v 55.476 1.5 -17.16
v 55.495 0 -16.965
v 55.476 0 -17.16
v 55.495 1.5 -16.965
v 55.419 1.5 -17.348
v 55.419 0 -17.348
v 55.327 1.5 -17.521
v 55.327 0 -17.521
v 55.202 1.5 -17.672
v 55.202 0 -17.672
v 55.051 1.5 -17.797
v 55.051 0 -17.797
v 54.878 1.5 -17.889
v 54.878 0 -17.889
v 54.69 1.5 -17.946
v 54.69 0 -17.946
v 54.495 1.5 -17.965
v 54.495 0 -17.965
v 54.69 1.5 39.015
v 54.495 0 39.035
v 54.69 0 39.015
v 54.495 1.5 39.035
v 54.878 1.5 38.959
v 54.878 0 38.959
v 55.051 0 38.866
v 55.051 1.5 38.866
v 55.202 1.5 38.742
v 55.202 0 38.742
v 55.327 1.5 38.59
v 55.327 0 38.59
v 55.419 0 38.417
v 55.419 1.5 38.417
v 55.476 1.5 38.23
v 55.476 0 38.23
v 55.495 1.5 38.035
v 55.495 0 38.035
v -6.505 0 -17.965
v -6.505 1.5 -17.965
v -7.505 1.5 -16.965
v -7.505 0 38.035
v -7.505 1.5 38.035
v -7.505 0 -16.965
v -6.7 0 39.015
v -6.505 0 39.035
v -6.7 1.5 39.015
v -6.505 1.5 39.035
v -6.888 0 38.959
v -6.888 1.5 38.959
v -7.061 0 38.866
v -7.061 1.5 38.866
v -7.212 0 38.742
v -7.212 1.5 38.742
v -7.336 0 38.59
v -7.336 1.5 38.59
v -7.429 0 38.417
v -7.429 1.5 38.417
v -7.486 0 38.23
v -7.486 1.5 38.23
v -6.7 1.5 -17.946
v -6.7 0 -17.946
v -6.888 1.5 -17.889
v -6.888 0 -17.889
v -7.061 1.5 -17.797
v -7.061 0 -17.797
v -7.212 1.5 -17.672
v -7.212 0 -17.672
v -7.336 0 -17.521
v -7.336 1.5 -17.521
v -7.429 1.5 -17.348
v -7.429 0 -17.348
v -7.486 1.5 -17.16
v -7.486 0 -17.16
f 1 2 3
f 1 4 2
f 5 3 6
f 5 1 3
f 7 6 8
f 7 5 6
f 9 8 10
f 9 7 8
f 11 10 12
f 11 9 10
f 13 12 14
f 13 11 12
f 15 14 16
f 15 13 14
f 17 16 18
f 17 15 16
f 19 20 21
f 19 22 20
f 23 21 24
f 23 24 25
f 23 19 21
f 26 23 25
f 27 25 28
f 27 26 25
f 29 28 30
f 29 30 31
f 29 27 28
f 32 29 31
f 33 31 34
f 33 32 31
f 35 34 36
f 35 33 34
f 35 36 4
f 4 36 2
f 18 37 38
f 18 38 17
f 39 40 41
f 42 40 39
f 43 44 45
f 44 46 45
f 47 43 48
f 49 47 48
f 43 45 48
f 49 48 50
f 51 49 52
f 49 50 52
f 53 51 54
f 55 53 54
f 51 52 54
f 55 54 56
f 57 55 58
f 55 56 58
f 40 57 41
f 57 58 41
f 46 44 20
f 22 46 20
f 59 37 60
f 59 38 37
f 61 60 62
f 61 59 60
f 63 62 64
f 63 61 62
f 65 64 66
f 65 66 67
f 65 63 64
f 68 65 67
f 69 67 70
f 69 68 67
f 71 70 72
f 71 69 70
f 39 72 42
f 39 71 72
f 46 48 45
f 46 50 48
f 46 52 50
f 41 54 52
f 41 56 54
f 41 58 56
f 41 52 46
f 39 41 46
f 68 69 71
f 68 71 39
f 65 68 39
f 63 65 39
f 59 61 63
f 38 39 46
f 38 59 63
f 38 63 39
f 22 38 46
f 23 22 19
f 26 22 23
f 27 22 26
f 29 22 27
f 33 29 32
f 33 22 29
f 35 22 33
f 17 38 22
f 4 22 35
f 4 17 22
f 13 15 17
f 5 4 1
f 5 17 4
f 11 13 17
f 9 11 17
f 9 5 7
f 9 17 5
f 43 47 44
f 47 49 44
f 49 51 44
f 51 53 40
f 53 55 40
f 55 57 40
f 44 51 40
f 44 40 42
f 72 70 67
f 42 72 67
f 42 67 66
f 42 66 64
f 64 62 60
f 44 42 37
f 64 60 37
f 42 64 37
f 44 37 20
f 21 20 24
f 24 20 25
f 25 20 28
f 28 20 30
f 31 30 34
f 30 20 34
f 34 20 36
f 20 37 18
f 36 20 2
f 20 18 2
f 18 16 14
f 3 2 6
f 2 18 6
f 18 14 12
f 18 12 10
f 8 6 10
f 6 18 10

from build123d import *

# Parameters (mm, degrees)
SKETCH1_W           = 63
SKETCH1_H           = 57
BOSS_EXTRUDE1_DEPTH = 1.5
FILLET1_R           = 1
FILLET2_R           = 1
FILLET3_R           = 1


with BuildPart() as part:
    # Sketch1 → Boss-Extrude1 (new body)
    with BuildSketch(Plane(origin=(0, 0, 0), x_dir=(1, 0, 0), z_dir=(0, 1, 0))):
        with Locations((23.995049505, -10.534653465)):
            Rectangle(SKETCH1_W, SKETCH1_H)
    extrude(amount=BOSS_EXTRUDE1_DEPTH)

    # Fillet1
    fillet1_edges = [part.edges().sort_by_distance(p)[0] for p in [
        (55.495049505, 0.75, 39.034653465),
    ]]
    fillet(fillet1_edges, radius=FILLET1_R)

    # Fillet2
    fillet2_edges = [part.edges().sort_by_distance(p)[0] for p in [
        (55.495049505, 0.75, -17.965346535),
    ]]
    fillet(fillet2_edges, radius=FILLET2_R)

    # Fillet3
    fillet3_edges = [part.edges().sort_by_distance(p)[0] for p in [
        (-7.504950495, 0.75, -17.965346535),
        (-7.504950495, 0.75, 39.034653465),
    ]]
    fillet(fillet3_edges, radius=FILLET3_R)


solid = part.part
